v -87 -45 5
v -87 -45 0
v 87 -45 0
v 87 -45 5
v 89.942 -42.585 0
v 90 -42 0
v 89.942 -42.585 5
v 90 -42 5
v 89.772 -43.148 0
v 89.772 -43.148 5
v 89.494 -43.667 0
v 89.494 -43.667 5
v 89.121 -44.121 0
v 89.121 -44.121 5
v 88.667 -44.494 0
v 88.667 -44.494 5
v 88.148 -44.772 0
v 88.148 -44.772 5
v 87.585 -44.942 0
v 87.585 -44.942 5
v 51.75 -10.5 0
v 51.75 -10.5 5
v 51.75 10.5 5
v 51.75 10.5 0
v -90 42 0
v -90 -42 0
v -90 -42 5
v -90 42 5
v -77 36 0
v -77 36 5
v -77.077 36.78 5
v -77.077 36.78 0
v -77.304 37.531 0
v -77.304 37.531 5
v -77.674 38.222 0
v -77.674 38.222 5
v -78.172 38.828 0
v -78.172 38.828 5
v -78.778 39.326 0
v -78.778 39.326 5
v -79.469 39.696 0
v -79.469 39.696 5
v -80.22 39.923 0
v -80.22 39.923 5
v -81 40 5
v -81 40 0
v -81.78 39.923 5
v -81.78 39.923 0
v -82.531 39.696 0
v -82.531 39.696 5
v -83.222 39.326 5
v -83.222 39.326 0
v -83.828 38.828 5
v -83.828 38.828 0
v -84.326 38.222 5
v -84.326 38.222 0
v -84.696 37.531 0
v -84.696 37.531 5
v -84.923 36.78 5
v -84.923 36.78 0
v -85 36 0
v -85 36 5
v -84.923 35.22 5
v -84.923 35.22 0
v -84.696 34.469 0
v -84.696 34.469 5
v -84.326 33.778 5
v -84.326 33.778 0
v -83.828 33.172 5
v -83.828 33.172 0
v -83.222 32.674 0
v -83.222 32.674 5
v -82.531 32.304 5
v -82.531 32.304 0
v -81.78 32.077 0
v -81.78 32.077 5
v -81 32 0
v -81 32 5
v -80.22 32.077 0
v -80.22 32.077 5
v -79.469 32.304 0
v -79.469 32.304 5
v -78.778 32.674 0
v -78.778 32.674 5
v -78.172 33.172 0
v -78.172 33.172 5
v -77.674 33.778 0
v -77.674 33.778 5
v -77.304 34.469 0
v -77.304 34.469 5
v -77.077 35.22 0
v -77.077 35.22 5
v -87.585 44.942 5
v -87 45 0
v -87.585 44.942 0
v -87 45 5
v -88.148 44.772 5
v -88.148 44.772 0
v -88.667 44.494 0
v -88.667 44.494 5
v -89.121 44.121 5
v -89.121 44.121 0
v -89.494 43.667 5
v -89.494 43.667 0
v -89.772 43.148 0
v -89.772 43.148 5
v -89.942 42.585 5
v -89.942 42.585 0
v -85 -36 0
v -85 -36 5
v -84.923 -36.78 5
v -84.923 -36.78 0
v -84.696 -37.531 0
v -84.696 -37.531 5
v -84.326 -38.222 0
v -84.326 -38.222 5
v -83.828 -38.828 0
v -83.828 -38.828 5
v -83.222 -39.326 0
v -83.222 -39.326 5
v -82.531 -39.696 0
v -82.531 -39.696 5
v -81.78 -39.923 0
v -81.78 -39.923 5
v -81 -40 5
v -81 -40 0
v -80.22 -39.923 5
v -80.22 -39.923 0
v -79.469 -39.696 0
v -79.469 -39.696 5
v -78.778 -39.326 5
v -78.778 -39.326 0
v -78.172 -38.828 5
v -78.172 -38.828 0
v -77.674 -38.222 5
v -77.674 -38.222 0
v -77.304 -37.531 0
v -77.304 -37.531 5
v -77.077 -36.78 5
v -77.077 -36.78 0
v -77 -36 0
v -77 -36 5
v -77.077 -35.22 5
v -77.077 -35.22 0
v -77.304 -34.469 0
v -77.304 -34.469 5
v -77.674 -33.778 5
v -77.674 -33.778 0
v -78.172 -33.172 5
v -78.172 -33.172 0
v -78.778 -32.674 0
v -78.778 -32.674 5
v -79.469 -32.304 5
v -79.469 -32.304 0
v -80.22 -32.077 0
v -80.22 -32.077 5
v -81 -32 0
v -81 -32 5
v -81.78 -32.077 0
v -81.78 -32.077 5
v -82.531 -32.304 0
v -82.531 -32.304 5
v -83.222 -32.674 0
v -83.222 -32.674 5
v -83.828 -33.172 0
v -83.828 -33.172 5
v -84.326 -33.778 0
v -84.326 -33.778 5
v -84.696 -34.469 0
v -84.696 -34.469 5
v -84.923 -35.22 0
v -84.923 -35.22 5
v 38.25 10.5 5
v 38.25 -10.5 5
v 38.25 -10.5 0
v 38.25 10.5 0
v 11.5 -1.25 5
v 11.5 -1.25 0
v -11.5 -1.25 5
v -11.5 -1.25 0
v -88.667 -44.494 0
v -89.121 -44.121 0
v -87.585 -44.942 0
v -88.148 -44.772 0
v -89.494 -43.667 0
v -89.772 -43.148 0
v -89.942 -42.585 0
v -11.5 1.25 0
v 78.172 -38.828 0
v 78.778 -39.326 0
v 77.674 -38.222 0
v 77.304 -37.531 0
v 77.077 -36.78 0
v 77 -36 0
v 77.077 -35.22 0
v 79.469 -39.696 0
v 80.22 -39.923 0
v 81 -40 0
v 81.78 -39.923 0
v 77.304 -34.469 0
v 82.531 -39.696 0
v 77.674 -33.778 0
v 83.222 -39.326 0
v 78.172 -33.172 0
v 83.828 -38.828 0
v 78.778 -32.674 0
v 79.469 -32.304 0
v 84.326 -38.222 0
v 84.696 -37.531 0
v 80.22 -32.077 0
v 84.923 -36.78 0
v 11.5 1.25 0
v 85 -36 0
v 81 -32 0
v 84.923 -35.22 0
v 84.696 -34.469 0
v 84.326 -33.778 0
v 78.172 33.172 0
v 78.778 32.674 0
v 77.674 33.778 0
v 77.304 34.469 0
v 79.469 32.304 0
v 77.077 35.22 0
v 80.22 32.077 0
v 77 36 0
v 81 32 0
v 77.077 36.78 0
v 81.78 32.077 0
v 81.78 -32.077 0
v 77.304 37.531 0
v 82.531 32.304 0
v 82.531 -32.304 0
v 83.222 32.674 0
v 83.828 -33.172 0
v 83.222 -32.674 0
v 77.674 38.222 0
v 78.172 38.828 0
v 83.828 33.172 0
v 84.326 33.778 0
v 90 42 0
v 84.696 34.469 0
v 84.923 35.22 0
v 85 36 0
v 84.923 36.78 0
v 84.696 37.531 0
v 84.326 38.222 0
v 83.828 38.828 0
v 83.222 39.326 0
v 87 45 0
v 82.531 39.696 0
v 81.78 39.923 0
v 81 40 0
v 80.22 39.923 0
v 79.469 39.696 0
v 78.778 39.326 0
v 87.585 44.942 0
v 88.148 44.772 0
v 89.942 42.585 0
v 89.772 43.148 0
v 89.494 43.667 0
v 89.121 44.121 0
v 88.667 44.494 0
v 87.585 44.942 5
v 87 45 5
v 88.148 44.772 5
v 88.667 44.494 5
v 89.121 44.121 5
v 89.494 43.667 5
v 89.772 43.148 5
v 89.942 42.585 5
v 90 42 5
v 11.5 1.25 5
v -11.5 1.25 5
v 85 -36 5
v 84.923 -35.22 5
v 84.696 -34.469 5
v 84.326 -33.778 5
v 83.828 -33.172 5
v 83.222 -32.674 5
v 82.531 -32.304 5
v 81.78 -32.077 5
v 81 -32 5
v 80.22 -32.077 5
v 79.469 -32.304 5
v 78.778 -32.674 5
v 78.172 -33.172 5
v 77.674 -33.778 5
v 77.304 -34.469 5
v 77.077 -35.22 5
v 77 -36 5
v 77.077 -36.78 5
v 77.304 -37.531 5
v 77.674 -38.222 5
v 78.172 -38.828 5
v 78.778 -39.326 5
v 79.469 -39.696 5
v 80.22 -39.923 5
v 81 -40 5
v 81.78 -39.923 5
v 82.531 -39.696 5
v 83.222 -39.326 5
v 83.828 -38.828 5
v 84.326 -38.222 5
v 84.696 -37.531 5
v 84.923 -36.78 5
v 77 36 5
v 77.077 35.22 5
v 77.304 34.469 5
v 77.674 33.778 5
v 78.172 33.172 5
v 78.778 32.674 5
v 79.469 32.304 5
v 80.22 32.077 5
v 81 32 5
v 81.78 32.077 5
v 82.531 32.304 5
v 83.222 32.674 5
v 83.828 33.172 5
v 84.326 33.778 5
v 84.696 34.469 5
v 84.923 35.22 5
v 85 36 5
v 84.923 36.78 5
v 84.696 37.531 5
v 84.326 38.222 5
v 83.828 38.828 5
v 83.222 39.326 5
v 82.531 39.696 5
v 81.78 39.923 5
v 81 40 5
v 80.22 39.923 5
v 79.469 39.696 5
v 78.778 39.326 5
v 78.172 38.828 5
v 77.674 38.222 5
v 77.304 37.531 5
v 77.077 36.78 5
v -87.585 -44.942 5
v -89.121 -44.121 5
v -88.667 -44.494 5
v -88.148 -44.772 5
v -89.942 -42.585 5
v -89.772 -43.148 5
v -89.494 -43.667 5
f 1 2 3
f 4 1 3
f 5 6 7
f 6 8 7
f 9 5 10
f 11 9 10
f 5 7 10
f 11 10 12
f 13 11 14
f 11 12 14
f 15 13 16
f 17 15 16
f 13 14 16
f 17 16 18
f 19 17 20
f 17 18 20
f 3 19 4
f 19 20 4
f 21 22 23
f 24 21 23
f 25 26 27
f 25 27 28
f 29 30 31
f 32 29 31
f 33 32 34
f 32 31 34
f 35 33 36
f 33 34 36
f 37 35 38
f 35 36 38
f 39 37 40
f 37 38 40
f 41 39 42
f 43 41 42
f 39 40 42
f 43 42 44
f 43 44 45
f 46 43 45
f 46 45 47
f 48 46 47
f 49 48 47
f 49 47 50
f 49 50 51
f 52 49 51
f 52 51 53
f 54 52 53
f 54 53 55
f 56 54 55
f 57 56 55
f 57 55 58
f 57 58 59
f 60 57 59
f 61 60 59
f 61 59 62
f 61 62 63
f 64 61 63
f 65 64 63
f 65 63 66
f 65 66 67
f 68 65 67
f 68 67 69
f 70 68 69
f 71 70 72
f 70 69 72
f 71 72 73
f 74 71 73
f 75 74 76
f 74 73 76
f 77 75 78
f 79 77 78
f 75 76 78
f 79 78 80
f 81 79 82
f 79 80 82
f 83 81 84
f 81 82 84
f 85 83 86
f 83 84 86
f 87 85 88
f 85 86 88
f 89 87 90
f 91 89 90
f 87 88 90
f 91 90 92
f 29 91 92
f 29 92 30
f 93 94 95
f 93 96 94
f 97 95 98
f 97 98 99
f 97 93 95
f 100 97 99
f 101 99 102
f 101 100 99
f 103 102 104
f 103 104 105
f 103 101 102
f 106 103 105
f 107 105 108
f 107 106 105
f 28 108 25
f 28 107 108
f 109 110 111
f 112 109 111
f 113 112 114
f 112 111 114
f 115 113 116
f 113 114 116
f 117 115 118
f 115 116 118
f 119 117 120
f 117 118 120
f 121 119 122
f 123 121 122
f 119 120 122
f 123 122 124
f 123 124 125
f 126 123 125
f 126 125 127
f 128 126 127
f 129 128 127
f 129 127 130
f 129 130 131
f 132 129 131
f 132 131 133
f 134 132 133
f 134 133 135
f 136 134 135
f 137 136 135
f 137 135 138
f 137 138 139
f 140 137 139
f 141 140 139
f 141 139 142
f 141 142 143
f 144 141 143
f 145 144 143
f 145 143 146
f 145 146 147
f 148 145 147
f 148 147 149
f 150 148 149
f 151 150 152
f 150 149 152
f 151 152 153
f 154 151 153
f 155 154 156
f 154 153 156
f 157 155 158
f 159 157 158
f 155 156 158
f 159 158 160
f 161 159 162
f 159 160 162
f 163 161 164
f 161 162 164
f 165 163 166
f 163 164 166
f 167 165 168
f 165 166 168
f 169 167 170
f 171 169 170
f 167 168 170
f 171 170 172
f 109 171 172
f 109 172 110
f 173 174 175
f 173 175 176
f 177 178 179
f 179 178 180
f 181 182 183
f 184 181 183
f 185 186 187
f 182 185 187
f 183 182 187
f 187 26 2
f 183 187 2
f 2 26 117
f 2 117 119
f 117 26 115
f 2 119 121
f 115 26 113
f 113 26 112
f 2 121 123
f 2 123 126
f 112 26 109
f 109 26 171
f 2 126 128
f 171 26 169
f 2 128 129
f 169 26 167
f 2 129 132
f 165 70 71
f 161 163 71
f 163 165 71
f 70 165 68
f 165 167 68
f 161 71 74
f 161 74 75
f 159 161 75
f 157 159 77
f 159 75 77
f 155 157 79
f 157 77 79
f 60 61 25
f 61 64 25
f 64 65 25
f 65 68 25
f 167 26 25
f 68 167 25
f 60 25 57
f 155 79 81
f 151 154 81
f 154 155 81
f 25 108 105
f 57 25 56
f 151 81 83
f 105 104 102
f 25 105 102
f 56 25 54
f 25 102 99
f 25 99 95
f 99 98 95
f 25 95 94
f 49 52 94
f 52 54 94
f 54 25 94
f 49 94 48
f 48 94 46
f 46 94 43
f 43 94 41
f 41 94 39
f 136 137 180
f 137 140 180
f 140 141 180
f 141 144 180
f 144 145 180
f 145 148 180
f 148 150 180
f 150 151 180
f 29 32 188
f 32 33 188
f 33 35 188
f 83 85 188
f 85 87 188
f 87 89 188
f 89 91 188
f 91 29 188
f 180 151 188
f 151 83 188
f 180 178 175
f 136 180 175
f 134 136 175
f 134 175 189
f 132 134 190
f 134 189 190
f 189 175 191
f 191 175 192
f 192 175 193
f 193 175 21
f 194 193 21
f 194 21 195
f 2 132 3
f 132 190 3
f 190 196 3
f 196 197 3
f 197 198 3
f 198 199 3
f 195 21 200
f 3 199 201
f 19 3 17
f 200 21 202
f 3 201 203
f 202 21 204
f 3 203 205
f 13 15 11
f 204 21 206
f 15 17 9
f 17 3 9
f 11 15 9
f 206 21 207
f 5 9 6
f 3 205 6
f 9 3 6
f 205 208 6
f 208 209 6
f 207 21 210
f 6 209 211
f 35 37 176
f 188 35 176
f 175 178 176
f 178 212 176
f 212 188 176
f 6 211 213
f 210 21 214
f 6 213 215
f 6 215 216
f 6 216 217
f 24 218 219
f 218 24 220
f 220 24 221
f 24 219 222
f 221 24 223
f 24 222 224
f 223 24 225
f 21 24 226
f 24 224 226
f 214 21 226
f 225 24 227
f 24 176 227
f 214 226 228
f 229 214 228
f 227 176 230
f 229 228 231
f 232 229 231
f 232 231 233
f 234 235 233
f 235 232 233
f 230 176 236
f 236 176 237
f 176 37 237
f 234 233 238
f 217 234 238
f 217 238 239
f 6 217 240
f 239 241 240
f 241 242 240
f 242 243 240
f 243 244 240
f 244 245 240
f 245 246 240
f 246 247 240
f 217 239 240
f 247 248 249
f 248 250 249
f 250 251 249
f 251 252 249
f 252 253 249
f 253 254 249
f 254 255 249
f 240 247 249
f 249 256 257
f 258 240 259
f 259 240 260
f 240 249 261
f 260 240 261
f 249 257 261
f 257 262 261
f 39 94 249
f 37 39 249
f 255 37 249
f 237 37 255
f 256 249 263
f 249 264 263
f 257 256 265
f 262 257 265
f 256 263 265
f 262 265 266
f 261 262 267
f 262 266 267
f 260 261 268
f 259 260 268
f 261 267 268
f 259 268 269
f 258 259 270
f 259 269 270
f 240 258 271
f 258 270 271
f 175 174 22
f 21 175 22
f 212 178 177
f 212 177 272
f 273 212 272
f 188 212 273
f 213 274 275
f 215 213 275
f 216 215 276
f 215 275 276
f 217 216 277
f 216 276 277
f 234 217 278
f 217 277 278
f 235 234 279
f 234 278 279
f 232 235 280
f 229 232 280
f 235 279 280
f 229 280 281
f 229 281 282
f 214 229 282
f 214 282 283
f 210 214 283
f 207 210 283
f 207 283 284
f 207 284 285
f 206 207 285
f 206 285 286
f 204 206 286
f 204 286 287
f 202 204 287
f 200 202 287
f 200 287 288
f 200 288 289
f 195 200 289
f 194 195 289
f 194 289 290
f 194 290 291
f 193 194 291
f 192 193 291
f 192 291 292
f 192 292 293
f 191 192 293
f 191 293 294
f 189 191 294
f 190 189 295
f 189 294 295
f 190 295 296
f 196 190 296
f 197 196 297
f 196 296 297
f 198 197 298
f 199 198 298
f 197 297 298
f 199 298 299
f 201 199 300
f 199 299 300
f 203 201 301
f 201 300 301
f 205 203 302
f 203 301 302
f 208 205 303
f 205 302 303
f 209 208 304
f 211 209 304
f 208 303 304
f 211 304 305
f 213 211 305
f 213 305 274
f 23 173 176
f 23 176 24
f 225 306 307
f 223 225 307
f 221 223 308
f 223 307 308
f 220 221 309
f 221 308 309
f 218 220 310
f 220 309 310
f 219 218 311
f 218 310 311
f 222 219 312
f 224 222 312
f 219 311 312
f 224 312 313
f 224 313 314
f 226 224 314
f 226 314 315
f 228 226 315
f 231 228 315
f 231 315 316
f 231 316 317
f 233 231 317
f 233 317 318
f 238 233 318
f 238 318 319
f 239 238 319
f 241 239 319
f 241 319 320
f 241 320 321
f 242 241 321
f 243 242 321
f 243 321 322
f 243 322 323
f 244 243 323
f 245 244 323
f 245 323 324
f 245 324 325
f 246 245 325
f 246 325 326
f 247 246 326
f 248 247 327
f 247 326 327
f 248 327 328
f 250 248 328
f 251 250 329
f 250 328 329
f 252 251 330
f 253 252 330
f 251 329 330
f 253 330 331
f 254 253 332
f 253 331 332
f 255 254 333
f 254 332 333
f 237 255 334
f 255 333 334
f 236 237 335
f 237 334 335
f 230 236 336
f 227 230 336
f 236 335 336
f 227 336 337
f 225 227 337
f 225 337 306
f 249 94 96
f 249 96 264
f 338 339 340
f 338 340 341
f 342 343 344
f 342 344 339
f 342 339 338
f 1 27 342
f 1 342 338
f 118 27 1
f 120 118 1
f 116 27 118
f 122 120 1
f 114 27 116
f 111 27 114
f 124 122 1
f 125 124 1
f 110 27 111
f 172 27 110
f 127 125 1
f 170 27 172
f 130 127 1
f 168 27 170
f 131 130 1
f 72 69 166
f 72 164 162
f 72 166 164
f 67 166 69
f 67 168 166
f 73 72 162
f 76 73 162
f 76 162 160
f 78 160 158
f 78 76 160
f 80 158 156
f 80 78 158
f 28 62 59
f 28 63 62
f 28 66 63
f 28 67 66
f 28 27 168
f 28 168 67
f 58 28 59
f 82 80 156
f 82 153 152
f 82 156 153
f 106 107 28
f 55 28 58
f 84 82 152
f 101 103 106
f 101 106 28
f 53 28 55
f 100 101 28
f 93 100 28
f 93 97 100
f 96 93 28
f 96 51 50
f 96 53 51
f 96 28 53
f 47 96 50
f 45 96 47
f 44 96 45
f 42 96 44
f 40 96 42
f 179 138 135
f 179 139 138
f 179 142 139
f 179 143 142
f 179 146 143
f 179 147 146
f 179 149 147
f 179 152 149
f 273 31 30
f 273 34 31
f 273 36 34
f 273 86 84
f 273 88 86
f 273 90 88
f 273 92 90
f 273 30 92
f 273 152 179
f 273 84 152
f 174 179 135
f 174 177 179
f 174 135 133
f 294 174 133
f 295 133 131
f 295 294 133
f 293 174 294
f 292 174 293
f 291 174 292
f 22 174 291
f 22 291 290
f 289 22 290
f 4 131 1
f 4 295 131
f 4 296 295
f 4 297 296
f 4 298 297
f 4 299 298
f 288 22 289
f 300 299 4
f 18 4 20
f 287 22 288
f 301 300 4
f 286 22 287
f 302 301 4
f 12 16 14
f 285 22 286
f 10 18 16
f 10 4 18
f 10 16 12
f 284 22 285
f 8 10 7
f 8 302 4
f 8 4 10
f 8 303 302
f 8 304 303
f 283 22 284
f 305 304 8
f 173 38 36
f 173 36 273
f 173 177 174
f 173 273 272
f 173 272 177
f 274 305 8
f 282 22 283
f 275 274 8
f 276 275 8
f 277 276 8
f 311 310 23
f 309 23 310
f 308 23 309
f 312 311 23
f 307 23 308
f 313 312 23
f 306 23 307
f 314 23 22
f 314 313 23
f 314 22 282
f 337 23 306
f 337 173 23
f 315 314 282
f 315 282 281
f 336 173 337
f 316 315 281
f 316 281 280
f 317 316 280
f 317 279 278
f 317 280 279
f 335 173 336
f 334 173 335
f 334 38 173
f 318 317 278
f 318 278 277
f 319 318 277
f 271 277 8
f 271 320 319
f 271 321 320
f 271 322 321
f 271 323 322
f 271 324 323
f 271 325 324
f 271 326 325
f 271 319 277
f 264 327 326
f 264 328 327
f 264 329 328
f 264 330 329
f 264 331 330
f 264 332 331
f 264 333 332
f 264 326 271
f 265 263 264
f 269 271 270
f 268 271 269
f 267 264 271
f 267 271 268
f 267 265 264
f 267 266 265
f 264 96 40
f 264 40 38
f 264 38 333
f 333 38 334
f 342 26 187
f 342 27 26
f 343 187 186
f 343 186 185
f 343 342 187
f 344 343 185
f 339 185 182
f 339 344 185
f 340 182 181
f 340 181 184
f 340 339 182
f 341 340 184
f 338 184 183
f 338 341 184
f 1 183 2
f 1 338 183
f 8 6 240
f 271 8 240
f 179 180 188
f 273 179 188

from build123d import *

# Parameters (mm, degrees)
SKETCH1_W           = 180
SKETCH1_H           = 90
BOSS_EXTRUDE1_DEPTH = 5
SKETCH2_R           = 4
CUT_EXTRUDE1_DEPTH  = 101.747208398
SKETCH3_W           = 23
SKETCH3_H           = 2.5
CUT_EXTRUDE2_DEPTH  = 101.747208398
FILLET1_R           = 3
FILLET2_R           = 3
FILLET3_R           = 3
FILLET4_R           = 3
SKETCH4_W           = 13.5
SKETCH4_H           = 21
CUT_EXTRUDE3_DEPTH  = 101.747208398


with BuildPart() as part:
    # Sketch1 → Boss-Extrude1 (new body)
    with BuildSketch(Plane.XY):
        Rectangle(SKETCH1_W, SKETCH1_H)
    extrude(amount=BOSS_EXTRUDE1_DEPTH)

    # Sketch2 → Cut-Extrude1 (cut, through all)
    with BuildSketch(Plane.XY.offset(5)):
        with Locations((-81, 36)):
            Circle(SKETCH2_R)
        with Locations(Location((81, 36, 0), (0, 0, 180))):
            Circle(SKETCH2_R)
        with Locations((81, -36)):
            Circle(SKETCH2_R)
        with Locations(Location((-81, -36, 0), (0, 0, 180))):
            Circle(SKETCH2_R)
    extrude(amount=-CUT_EXTRUDE1_DEPTH, mode=Mode.SUBTRACT)

    # Sketch3 → Cut-Extrude2 (cut, through all)
    with BuildSketch(Plane(origin=(0, 0, 0), x_dir=(-1, 0, 0), z_dir=(0, 0, -1))):
        Rectangle(SKETCH3_W, SKETCH3_H)
    extrude(amount=-CUT_EXTRUDE2_DEPTH, mode=Mode.SUBTRACT)

    # Fillet1
    fillet1_edges = [part.edges().sort_by_distance(p)[0] for p in [
        (90, 45, 2.5),
    ]]
    fillet(fillet1_edges, radius=FILLET1_R)

    # Fillet2
    fillet2_edges = [part.edges().sort_by_distance(p)[0] for p in [
        (90, -45, 2.5),
    ]]
    fillet(fillet2_edges, radius=FILLET2_R)

    # Fillet3
    fillet3_edges = [part.edges().sort_by_distance(p)[0] for p in [
        (-90, 45, 2.5),
    ]]
    fillet(fillet3_edges, radius=FILLET3_R)

    # Fillet4
    fillet4_edges = [part.edges().sort_by_distance(p)[0] for p in [
        (-90, -45, 2.5),
    ]]
    fillet(fillet4_edges, radius=FILLET4_R)

    # Sketch4 → Cut-Extrude3 (cut, through all)
    with BuildSketch(Plane.XY.offset(5)):
        with Locations((45, 0)):
            Rectangle(SKETCH4_W, SKETCH4_H)
    extrude(amount=-CUT_EXTRUDE3_DEPTH, mode=Mode.SUBTRACT)


solid = part.part
